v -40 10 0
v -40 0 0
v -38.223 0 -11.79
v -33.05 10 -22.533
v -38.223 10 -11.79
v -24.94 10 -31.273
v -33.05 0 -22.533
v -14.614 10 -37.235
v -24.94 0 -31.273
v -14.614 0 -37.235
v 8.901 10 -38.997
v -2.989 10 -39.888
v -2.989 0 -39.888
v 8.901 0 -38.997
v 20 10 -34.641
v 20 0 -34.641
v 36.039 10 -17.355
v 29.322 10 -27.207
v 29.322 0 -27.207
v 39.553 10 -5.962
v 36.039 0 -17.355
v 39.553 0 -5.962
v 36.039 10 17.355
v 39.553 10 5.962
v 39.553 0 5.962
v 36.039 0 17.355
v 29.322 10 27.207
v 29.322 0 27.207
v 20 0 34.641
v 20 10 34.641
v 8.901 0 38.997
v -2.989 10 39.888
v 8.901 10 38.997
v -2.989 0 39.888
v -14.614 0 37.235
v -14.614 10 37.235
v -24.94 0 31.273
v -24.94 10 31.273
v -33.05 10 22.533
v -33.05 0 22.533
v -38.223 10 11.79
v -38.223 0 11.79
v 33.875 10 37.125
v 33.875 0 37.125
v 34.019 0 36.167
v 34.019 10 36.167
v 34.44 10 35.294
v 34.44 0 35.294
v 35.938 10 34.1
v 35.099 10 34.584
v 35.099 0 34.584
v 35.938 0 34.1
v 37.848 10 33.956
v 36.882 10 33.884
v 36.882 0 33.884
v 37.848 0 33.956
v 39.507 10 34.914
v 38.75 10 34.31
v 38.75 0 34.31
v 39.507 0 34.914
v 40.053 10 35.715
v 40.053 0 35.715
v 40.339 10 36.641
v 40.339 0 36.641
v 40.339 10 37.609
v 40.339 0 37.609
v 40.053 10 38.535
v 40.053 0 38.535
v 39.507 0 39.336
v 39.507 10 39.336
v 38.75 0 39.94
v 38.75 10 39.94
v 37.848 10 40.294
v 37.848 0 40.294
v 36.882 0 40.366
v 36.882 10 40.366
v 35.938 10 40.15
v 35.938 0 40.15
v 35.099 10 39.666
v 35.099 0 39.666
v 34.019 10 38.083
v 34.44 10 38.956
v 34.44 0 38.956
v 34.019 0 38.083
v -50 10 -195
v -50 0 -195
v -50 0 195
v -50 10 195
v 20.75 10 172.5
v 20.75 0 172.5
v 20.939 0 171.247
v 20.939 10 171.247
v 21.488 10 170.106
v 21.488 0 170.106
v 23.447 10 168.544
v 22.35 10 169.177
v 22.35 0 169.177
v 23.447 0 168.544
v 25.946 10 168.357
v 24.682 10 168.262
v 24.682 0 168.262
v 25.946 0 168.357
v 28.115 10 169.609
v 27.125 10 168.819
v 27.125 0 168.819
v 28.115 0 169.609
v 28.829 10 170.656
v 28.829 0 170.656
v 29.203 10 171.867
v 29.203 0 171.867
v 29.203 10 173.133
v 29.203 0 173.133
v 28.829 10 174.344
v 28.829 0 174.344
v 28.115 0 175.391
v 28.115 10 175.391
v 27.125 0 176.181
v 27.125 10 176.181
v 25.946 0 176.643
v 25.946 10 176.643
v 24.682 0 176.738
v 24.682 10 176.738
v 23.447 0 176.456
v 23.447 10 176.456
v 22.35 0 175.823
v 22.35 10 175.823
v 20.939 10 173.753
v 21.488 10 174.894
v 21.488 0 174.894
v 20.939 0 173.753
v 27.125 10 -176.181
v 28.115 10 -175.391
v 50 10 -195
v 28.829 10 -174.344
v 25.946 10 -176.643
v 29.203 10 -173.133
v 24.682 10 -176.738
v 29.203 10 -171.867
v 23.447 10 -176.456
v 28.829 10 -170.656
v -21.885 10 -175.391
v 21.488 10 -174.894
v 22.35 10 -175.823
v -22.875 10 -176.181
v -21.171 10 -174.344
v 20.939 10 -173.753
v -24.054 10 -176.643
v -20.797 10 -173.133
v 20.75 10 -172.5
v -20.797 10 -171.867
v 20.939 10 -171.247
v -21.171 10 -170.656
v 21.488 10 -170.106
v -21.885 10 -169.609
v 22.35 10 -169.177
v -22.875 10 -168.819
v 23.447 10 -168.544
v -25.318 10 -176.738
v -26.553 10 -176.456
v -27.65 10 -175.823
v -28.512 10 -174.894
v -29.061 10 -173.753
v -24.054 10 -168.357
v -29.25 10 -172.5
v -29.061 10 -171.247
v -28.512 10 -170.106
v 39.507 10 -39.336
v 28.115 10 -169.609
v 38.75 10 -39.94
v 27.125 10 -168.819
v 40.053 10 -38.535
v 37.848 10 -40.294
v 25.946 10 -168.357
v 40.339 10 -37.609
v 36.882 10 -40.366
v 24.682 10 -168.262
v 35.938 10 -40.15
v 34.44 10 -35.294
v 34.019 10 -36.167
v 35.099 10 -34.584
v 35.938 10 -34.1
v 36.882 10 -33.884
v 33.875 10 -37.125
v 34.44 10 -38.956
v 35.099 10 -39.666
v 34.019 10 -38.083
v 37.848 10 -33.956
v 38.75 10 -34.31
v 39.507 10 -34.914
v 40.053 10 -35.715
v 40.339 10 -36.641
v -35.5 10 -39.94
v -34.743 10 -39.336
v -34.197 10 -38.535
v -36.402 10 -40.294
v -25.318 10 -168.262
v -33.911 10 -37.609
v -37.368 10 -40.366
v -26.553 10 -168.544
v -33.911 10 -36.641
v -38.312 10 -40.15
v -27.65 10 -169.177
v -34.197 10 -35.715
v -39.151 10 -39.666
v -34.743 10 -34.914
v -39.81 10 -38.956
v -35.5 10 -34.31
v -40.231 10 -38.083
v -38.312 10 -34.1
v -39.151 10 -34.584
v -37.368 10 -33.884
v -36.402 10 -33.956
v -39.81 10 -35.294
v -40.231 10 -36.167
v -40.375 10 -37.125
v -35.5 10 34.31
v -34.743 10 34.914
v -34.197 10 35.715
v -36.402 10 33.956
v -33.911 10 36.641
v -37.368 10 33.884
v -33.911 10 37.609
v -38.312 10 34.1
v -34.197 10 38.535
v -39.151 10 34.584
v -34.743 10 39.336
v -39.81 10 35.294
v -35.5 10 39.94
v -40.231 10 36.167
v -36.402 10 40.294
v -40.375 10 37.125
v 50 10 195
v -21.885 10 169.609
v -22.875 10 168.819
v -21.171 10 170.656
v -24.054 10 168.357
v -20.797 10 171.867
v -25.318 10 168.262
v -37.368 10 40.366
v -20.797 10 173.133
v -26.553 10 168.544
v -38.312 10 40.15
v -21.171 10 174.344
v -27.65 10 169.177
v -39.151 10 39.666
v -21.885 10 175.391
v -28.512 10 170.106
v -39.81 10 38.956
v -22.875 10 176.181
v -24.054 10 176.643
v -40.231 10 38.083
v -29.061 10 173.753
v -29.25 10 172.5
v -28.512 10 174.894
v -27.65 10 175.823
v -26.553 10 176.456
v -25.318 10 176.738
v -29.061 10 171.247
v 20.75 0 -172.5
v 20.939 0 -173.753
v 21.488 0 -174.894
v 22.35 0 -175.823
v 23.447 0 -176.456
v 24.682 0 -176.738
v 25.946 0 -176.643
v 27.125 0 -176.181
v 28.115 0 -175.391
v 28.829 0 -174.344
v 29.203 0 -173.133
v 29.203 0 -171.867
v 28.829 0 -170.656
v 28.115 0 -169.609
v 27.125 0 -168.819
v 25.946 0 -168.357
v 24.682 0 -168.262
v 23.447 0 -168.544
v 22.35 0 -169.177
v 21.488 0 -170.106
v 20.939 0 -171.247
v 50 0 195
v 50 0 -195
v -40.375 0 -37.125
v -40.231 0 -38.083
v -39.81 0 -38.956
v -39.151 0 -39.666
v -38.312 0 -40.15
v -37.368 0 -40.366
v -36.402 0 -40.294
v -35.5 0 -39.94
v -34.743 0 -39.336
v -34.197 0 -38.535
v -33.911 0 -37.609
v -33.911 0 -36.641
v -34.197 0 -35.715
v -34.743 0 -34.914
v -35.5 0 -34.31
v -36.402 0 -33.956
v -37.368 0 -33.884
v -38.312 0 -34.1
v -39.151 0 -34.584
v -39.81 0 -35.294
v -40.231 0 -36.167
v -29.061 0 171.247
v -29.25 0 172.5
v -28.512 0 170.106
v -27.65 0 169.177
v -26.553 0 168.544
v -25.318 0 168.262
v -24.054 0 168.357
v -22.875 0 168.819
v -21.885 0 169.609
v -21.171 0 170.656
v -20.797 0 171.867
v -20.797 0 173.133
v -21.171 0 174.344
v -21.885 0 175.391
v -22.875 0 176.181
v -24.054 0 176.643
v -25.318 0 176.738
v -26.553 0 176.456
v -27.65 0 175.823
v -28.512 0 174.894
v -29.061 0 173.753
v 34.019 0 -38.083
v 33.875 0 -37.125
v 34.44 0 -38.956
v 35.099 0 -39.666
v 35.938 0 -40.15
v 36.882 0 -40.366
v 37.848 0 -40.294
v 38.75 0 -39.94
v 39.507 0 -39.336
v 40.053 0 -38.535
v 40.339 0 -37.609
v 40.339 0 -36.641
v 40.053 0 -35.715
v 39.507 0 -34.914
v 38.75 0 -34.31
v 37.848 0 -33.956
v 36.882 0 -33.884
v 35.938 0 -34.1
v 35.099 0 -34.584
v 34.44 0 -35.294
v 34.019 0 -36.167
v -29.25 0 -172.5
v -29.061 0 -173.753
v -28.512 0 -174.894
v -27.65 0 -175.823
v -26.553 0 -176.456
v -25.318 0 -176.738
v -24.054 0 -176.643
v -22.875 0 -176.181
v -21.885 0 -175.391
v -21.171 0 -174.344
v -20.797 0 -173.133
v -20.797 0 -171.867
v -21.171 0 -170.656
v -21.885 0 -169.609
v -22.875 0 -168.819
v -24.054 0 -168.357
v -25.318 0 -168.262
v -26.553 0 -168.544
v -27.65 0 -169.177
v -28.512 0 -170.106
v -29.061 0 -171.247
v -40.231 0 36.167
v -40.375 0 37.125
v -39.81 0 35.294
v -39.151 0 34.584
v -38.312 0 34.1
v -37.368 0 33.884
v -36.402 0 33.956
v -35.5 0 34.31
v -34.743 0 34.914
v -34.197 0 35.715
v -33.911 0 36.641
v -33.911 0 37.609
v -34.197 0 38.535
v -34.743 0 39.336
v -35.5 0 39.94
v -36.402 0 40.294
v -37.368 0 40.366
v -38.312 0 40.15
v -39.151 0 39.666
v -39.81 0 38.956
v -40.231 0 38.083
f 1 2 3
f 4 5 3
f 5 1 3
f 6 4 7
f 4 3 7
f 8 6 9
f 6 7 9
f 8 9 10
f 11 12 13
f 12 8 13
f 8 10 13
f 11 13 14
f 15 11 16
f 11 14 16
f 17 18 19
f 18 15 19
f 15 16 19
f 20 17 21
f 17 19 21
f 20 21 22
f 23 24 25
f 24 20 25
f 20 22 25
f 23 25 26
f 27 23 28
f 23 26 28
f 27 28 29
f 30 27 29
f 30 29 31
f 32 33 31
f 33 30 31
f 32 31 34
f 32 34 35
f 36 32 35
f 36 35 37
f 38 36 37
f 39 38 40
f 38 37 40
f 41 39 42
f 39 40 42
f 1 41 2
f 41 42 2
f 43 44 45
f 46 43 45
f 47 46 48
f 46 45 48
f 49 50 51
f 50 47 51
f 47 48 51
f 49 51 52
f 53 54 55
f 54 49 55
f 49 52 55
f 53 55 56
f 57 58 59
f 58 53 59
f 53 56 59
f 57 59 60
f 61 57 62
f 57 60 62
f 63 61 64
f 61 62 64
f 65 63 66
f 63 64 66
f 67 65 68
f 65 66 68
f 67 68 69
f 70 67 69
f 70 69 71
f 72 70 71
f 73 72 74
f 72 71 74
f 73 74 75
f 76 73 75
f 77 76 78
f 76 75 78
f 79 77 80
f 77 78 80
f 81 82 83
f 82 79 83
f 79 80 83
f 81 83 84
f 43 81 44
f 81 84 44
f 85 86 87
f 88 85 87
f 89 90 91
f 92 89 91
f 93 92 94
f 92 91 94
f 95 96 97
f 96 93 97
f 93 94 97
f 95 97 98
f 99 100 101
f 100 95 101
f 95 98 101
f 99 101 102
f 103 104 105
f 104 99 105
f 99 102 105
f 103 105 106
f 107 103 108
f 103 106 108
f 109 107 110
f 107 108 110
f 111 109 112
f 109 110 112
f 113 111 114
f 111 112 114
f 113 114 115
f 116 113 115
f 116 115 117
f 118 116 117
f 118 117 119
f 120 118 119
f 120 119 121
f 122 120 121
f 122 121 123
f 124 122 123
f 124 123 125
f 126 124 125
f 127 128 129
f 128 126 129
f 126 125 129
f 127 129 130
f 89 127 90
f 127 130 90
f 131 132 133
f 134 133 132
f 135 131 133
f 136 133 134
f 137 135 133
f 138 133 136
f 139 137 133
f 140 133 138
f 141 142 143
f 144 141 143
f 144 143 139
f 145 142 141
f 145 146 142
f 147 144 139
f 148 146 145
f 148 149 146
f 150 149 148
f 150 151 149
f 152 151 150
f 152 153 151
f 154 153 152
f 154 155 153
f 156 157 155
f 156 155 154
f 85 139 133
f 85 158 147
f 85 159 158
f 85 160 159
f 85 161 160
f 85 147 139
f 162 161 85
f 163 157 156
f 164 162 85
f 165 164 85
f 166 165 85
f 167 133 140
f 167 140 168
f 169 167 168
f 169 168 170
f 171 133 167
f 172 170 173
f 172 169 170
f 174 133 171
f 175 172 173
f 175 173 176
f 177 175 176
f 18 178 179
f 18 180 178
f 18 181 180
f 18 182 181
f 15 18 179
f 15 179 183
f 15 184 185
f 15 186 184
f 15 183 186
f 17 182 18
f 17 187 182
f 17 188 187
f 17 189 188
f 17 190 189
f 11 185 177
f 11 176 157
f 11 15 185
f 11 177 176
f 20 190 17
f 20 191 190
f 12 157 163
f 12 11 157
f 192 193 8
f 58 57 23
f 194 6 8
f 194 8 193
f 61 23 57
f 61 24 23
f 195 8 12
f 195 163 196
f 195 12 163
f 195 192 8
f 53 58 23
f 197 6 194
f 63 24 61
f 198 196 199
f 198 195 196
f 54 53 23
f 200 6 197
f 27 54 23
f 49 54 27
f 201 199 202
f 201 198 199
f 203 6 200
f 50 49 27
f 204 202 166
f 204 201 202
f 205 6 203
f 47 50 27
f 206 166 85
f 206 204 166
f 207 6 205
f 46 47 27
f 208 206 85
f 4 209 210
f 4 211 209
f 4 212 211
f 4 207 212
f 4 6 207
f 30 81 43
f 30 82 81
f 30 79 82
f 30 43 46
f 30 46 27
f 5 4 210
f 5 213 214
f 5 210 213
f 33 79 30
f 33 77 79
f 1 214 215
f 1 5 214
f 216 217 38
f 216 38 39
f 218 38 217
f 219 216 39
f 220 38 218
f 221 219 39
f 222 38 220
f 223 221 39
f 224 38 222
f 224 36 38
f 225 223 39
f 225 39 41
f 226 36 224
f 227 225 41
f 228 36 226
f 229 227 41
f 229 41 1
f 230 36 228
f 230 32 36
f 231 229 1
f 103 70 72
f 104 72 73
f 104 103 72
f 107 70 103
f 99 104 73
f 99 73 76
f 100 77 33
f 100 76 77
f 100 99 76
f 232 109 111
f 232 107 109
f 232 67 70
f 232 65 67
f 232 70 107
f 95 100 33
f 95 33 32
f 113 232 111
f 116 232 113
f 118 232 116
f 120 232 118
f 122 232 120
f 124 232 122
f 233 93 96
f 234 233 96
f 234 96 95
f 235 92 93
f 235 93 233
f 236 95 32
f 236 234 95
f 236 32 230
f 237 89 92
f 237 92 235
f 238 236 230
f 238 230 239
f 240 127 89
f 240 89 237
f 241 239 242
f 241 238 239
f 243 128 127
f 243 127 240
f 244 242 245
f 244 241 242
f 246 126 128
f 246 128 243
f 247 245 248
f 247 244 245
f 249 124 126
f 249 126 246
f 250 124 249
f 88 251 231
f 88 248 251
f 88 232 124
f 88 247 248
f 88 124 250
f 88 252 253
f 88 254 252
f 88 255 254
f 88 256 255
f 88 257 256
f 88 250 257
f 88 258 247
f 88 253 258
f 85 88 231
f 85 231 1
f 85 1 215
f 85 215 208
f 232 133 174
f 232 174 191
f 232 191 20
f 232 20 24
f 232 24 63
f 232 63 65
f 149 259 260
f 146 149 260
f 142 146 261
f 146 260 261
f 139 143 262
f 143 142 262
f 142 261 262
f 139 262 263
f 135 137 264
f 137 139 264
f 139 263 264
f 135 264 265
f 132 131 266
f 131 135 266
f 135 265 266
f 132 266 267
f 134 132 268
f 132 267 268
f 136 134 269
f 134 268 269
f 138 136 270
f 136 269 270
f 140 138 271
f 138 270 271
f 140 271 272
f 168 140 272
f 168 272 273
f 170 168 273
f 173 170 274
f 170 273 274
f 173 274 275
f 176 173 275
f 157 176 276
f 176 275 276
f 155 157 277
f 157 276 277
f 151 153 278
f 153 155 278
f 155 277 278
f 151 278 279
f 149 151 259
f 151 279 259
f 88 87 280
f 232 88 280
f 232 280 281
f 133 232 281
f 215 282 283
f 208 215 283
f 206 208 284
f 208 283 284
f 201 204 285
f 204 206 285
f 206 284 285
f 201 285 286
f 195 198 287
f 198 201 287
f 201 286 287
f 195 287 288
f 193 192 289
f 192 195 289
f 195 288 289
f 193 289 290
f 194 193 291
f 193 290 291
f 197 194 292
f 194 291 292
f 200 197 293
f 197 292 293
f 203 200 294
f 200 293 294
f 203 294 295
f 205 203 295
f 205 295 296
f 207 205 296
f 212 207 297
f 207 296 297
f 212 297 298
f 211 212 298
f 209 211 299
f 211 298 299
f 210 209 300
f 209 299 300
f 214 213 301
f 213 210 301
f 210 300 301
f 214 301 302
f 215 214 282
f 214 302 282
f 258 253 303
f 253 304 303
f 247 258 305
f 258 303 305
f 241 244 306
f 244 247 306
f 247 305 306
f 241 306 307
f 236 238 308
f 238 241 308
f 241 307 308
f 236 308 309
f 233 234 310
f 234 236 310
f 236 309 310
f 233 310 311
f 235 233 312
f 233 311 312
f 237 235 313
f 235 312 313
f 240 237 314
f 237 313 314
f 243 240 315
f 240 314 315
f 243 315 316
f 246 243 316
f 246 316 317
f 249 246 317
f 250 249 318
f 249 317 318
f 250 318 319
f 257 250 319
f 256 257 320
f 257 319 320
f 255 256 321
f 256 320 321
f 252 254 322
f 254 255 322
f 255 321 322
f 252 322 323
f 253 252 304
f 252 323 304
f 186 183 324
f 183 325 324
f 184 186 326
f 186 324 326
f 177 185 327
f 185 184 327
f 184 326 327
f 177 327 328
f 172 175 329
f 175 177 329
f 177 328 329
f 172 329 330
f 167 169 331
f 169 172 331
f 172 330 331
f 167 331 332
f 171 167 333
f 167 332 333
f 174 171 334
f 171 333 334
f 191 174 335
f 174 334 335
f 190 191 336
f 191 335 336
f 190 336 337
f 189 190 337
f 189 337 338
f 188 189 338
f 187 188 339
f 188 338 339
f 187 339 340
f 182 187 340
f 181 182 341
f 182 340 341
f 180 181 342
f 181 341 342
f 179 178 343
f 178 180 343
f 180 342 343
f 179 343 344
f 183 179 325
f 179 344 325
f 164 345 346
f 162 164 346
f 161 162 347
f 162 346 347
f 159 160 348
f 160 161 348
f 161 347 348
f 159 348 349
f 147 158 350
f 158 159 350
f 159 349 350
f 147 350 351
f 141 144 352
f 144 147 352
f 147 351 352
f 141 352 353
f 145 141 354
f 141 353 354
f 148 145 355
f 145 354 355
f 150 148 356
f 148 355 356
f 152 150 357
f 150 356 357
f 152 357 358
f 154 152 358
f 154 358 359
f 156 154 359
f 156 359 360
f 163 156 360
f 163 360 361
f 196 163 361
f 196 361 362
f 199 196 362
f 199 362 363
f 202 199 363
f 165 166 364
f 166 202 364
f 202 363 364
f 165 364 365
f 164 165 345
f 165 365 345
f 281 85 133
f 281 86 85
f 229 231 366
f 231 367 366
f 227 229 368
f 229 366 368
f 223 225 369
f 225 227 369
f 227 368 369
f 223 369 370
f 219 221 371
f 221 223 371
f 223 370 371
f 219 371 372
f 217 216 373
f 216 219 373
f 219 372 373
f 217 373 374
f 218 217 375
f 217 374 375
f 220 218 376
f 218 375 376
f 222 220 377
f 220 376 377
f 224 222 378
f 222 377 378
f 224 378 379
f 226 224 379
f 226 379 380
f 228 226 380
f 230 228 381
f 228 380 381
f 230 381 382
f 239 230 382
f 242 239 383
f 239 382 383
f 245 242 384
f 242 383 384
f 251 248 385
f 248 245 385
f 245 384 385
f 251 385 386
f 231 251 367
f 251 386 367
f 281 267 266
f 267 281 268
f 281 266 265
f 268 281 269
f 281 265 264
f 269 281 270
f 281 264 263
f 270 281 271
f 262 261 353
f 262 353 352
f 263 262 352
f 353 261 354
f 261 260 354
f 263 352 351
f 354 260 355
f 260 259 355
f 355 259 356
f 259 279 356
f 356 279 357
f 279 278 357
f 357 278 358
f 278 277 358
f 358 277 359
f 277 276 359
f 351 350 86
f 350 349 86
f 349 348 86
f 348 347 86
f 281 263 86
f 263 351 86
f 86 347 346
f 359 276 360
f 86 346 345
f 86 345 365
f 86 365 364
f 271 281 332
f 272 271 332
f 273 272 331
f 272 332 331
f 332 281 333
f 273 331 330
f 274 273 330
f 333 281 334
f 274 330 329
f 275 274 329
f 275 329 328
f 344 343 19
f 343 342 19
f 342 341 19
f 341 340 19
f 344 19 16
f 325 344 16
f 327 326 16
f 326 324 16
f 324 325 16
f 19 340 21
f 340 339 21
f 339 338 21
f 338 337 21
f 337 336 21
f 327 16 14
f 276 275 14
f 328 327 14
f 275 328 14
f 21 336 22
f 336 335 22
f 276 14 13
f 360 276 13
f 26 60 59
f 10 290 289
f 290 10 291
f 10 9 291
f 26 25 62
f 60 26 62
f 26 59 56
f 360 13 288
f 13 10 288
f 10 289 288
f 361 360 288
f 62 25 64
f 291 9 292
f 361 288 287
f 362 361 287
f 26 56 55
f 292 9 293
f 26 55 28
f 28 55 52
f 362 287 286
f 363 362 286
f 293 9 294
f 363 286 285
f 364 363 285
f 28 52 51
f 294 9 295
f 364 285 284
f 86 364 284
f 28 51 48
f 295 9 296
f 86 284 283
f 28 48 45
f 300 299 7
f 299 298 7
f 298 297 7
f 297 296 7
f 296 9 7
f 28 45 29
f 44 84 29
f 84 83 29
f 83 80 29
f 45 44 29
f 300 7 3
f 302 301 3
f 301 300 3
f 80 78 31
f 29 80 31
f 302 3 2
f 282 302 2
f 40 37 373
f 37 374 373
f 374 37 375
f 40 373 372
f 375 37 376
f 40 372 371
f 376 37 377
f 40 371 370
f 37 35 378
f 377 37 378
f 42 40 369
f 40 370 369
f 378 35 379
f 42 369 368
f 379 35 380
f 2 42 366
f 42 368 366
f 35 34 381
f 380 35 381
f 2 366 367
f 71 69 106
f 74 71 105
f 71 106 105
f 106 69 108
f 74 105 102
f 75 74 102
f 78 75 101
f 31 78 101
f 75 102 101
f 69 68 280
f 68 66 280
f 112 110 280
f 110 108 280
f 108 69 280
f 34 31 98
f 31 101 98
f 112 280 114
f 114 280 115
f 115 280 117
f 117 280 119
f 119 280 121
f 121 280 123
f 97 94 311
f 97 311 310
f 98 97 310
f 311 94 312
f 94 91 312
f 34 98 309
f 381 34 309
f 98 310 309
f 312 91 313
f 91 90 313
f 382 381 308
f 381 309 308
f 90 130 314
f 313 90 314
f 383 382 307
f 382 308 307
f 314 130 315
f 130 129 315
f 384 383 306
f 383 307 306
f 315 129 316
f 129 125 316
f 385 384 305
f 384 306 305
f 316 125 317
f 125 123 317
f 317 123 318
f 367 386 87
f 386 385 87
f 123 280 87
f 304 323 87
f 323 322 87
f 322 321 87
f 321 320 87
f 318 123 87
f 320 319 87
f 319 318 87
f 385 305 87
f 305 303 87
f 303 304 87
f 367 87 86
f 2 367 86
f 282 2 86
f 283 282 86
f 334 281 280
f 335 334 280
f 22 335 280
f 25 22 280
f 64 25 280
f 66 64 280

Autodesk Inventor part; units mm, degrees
ref_plane "YZ Plane" through (0, 0, 0) normal (1, 0, 0) x (0, 1, 0)
ref_plane "XZ Plane" through (0, 0, 0) normal (0, 1, 0) x (-1, 0, 0)
ref_plane "XY Plane" through (0, 0, 0) normal (0, 0, 1) x (1, 0, 0)
sketch "Sketch1" plane through (0, 0, 0) normal (0, 1, 0) x (-1, 0, 0)
  line L0 (-50, 195) -> (-50, -195)
  line L1 (50, -195) -> (50, 195)
  circle A0 centre (0, 0) radius 40
  line L2 (70, 37.125) -> (-67, 37.125) construction
  line L3 (70, -37.125) -> (-81, -37.125) construction
  circle A1 centre (37.125, 37.125) radius 3.25
  circle A2 centre (37.125, -37.125) radius 3.25
  circle A3 centre (-37.125, -37.125) radius 3.25
  circle A4 centre (-37.125, 37.125) radius 3.25
  line L4 (50, 195) -> (-50, 195)
  line L5 (50, -195) -> (-50, -195)
  line L6 (97, 172.5) -> (-97, 172.5) construction
  line L7 (88, -172.5) -> (-85, -172.5) construction
  line L8 (-25, 119) -> (-25, -106) construction
  line L9 (25, -106) -> (25, 119) construction
  circle A5 centre (25, 172.5) radius 4.25
  circle A6 centre (-25, 172.5) radius 4.25
  circle A7 centre (-25, -172.5) radius 4.25
  circle A8 centre (25, -172.5) radius 4.25
  dimension "d0" = 80
  dimension "d5" = 74.25
  dimension "d6" = 37.125
  dimension "d7" = 6.5
  dimension "d12" = 74.25
  dimension "d14" = 37.125
  dimension "d15" = 37.125
  dimension "d16" = 37.125
  dimension "d24" = 50
  dimension "d25" = 25
  dimension "d26" = 8.5
  dimension "d29" = 390
  dimension "d30" = 195
  dimension "d31" = 100
  dimension "d32" = 50
  dimension "d33" = 22.5
  dimension "d34" = 22.5
extrude "Extrusion2" add sketch "Sketch1" along normal blind 10
properties part number "1223_Motor Plate_V1" material "Wood (Birch)"
